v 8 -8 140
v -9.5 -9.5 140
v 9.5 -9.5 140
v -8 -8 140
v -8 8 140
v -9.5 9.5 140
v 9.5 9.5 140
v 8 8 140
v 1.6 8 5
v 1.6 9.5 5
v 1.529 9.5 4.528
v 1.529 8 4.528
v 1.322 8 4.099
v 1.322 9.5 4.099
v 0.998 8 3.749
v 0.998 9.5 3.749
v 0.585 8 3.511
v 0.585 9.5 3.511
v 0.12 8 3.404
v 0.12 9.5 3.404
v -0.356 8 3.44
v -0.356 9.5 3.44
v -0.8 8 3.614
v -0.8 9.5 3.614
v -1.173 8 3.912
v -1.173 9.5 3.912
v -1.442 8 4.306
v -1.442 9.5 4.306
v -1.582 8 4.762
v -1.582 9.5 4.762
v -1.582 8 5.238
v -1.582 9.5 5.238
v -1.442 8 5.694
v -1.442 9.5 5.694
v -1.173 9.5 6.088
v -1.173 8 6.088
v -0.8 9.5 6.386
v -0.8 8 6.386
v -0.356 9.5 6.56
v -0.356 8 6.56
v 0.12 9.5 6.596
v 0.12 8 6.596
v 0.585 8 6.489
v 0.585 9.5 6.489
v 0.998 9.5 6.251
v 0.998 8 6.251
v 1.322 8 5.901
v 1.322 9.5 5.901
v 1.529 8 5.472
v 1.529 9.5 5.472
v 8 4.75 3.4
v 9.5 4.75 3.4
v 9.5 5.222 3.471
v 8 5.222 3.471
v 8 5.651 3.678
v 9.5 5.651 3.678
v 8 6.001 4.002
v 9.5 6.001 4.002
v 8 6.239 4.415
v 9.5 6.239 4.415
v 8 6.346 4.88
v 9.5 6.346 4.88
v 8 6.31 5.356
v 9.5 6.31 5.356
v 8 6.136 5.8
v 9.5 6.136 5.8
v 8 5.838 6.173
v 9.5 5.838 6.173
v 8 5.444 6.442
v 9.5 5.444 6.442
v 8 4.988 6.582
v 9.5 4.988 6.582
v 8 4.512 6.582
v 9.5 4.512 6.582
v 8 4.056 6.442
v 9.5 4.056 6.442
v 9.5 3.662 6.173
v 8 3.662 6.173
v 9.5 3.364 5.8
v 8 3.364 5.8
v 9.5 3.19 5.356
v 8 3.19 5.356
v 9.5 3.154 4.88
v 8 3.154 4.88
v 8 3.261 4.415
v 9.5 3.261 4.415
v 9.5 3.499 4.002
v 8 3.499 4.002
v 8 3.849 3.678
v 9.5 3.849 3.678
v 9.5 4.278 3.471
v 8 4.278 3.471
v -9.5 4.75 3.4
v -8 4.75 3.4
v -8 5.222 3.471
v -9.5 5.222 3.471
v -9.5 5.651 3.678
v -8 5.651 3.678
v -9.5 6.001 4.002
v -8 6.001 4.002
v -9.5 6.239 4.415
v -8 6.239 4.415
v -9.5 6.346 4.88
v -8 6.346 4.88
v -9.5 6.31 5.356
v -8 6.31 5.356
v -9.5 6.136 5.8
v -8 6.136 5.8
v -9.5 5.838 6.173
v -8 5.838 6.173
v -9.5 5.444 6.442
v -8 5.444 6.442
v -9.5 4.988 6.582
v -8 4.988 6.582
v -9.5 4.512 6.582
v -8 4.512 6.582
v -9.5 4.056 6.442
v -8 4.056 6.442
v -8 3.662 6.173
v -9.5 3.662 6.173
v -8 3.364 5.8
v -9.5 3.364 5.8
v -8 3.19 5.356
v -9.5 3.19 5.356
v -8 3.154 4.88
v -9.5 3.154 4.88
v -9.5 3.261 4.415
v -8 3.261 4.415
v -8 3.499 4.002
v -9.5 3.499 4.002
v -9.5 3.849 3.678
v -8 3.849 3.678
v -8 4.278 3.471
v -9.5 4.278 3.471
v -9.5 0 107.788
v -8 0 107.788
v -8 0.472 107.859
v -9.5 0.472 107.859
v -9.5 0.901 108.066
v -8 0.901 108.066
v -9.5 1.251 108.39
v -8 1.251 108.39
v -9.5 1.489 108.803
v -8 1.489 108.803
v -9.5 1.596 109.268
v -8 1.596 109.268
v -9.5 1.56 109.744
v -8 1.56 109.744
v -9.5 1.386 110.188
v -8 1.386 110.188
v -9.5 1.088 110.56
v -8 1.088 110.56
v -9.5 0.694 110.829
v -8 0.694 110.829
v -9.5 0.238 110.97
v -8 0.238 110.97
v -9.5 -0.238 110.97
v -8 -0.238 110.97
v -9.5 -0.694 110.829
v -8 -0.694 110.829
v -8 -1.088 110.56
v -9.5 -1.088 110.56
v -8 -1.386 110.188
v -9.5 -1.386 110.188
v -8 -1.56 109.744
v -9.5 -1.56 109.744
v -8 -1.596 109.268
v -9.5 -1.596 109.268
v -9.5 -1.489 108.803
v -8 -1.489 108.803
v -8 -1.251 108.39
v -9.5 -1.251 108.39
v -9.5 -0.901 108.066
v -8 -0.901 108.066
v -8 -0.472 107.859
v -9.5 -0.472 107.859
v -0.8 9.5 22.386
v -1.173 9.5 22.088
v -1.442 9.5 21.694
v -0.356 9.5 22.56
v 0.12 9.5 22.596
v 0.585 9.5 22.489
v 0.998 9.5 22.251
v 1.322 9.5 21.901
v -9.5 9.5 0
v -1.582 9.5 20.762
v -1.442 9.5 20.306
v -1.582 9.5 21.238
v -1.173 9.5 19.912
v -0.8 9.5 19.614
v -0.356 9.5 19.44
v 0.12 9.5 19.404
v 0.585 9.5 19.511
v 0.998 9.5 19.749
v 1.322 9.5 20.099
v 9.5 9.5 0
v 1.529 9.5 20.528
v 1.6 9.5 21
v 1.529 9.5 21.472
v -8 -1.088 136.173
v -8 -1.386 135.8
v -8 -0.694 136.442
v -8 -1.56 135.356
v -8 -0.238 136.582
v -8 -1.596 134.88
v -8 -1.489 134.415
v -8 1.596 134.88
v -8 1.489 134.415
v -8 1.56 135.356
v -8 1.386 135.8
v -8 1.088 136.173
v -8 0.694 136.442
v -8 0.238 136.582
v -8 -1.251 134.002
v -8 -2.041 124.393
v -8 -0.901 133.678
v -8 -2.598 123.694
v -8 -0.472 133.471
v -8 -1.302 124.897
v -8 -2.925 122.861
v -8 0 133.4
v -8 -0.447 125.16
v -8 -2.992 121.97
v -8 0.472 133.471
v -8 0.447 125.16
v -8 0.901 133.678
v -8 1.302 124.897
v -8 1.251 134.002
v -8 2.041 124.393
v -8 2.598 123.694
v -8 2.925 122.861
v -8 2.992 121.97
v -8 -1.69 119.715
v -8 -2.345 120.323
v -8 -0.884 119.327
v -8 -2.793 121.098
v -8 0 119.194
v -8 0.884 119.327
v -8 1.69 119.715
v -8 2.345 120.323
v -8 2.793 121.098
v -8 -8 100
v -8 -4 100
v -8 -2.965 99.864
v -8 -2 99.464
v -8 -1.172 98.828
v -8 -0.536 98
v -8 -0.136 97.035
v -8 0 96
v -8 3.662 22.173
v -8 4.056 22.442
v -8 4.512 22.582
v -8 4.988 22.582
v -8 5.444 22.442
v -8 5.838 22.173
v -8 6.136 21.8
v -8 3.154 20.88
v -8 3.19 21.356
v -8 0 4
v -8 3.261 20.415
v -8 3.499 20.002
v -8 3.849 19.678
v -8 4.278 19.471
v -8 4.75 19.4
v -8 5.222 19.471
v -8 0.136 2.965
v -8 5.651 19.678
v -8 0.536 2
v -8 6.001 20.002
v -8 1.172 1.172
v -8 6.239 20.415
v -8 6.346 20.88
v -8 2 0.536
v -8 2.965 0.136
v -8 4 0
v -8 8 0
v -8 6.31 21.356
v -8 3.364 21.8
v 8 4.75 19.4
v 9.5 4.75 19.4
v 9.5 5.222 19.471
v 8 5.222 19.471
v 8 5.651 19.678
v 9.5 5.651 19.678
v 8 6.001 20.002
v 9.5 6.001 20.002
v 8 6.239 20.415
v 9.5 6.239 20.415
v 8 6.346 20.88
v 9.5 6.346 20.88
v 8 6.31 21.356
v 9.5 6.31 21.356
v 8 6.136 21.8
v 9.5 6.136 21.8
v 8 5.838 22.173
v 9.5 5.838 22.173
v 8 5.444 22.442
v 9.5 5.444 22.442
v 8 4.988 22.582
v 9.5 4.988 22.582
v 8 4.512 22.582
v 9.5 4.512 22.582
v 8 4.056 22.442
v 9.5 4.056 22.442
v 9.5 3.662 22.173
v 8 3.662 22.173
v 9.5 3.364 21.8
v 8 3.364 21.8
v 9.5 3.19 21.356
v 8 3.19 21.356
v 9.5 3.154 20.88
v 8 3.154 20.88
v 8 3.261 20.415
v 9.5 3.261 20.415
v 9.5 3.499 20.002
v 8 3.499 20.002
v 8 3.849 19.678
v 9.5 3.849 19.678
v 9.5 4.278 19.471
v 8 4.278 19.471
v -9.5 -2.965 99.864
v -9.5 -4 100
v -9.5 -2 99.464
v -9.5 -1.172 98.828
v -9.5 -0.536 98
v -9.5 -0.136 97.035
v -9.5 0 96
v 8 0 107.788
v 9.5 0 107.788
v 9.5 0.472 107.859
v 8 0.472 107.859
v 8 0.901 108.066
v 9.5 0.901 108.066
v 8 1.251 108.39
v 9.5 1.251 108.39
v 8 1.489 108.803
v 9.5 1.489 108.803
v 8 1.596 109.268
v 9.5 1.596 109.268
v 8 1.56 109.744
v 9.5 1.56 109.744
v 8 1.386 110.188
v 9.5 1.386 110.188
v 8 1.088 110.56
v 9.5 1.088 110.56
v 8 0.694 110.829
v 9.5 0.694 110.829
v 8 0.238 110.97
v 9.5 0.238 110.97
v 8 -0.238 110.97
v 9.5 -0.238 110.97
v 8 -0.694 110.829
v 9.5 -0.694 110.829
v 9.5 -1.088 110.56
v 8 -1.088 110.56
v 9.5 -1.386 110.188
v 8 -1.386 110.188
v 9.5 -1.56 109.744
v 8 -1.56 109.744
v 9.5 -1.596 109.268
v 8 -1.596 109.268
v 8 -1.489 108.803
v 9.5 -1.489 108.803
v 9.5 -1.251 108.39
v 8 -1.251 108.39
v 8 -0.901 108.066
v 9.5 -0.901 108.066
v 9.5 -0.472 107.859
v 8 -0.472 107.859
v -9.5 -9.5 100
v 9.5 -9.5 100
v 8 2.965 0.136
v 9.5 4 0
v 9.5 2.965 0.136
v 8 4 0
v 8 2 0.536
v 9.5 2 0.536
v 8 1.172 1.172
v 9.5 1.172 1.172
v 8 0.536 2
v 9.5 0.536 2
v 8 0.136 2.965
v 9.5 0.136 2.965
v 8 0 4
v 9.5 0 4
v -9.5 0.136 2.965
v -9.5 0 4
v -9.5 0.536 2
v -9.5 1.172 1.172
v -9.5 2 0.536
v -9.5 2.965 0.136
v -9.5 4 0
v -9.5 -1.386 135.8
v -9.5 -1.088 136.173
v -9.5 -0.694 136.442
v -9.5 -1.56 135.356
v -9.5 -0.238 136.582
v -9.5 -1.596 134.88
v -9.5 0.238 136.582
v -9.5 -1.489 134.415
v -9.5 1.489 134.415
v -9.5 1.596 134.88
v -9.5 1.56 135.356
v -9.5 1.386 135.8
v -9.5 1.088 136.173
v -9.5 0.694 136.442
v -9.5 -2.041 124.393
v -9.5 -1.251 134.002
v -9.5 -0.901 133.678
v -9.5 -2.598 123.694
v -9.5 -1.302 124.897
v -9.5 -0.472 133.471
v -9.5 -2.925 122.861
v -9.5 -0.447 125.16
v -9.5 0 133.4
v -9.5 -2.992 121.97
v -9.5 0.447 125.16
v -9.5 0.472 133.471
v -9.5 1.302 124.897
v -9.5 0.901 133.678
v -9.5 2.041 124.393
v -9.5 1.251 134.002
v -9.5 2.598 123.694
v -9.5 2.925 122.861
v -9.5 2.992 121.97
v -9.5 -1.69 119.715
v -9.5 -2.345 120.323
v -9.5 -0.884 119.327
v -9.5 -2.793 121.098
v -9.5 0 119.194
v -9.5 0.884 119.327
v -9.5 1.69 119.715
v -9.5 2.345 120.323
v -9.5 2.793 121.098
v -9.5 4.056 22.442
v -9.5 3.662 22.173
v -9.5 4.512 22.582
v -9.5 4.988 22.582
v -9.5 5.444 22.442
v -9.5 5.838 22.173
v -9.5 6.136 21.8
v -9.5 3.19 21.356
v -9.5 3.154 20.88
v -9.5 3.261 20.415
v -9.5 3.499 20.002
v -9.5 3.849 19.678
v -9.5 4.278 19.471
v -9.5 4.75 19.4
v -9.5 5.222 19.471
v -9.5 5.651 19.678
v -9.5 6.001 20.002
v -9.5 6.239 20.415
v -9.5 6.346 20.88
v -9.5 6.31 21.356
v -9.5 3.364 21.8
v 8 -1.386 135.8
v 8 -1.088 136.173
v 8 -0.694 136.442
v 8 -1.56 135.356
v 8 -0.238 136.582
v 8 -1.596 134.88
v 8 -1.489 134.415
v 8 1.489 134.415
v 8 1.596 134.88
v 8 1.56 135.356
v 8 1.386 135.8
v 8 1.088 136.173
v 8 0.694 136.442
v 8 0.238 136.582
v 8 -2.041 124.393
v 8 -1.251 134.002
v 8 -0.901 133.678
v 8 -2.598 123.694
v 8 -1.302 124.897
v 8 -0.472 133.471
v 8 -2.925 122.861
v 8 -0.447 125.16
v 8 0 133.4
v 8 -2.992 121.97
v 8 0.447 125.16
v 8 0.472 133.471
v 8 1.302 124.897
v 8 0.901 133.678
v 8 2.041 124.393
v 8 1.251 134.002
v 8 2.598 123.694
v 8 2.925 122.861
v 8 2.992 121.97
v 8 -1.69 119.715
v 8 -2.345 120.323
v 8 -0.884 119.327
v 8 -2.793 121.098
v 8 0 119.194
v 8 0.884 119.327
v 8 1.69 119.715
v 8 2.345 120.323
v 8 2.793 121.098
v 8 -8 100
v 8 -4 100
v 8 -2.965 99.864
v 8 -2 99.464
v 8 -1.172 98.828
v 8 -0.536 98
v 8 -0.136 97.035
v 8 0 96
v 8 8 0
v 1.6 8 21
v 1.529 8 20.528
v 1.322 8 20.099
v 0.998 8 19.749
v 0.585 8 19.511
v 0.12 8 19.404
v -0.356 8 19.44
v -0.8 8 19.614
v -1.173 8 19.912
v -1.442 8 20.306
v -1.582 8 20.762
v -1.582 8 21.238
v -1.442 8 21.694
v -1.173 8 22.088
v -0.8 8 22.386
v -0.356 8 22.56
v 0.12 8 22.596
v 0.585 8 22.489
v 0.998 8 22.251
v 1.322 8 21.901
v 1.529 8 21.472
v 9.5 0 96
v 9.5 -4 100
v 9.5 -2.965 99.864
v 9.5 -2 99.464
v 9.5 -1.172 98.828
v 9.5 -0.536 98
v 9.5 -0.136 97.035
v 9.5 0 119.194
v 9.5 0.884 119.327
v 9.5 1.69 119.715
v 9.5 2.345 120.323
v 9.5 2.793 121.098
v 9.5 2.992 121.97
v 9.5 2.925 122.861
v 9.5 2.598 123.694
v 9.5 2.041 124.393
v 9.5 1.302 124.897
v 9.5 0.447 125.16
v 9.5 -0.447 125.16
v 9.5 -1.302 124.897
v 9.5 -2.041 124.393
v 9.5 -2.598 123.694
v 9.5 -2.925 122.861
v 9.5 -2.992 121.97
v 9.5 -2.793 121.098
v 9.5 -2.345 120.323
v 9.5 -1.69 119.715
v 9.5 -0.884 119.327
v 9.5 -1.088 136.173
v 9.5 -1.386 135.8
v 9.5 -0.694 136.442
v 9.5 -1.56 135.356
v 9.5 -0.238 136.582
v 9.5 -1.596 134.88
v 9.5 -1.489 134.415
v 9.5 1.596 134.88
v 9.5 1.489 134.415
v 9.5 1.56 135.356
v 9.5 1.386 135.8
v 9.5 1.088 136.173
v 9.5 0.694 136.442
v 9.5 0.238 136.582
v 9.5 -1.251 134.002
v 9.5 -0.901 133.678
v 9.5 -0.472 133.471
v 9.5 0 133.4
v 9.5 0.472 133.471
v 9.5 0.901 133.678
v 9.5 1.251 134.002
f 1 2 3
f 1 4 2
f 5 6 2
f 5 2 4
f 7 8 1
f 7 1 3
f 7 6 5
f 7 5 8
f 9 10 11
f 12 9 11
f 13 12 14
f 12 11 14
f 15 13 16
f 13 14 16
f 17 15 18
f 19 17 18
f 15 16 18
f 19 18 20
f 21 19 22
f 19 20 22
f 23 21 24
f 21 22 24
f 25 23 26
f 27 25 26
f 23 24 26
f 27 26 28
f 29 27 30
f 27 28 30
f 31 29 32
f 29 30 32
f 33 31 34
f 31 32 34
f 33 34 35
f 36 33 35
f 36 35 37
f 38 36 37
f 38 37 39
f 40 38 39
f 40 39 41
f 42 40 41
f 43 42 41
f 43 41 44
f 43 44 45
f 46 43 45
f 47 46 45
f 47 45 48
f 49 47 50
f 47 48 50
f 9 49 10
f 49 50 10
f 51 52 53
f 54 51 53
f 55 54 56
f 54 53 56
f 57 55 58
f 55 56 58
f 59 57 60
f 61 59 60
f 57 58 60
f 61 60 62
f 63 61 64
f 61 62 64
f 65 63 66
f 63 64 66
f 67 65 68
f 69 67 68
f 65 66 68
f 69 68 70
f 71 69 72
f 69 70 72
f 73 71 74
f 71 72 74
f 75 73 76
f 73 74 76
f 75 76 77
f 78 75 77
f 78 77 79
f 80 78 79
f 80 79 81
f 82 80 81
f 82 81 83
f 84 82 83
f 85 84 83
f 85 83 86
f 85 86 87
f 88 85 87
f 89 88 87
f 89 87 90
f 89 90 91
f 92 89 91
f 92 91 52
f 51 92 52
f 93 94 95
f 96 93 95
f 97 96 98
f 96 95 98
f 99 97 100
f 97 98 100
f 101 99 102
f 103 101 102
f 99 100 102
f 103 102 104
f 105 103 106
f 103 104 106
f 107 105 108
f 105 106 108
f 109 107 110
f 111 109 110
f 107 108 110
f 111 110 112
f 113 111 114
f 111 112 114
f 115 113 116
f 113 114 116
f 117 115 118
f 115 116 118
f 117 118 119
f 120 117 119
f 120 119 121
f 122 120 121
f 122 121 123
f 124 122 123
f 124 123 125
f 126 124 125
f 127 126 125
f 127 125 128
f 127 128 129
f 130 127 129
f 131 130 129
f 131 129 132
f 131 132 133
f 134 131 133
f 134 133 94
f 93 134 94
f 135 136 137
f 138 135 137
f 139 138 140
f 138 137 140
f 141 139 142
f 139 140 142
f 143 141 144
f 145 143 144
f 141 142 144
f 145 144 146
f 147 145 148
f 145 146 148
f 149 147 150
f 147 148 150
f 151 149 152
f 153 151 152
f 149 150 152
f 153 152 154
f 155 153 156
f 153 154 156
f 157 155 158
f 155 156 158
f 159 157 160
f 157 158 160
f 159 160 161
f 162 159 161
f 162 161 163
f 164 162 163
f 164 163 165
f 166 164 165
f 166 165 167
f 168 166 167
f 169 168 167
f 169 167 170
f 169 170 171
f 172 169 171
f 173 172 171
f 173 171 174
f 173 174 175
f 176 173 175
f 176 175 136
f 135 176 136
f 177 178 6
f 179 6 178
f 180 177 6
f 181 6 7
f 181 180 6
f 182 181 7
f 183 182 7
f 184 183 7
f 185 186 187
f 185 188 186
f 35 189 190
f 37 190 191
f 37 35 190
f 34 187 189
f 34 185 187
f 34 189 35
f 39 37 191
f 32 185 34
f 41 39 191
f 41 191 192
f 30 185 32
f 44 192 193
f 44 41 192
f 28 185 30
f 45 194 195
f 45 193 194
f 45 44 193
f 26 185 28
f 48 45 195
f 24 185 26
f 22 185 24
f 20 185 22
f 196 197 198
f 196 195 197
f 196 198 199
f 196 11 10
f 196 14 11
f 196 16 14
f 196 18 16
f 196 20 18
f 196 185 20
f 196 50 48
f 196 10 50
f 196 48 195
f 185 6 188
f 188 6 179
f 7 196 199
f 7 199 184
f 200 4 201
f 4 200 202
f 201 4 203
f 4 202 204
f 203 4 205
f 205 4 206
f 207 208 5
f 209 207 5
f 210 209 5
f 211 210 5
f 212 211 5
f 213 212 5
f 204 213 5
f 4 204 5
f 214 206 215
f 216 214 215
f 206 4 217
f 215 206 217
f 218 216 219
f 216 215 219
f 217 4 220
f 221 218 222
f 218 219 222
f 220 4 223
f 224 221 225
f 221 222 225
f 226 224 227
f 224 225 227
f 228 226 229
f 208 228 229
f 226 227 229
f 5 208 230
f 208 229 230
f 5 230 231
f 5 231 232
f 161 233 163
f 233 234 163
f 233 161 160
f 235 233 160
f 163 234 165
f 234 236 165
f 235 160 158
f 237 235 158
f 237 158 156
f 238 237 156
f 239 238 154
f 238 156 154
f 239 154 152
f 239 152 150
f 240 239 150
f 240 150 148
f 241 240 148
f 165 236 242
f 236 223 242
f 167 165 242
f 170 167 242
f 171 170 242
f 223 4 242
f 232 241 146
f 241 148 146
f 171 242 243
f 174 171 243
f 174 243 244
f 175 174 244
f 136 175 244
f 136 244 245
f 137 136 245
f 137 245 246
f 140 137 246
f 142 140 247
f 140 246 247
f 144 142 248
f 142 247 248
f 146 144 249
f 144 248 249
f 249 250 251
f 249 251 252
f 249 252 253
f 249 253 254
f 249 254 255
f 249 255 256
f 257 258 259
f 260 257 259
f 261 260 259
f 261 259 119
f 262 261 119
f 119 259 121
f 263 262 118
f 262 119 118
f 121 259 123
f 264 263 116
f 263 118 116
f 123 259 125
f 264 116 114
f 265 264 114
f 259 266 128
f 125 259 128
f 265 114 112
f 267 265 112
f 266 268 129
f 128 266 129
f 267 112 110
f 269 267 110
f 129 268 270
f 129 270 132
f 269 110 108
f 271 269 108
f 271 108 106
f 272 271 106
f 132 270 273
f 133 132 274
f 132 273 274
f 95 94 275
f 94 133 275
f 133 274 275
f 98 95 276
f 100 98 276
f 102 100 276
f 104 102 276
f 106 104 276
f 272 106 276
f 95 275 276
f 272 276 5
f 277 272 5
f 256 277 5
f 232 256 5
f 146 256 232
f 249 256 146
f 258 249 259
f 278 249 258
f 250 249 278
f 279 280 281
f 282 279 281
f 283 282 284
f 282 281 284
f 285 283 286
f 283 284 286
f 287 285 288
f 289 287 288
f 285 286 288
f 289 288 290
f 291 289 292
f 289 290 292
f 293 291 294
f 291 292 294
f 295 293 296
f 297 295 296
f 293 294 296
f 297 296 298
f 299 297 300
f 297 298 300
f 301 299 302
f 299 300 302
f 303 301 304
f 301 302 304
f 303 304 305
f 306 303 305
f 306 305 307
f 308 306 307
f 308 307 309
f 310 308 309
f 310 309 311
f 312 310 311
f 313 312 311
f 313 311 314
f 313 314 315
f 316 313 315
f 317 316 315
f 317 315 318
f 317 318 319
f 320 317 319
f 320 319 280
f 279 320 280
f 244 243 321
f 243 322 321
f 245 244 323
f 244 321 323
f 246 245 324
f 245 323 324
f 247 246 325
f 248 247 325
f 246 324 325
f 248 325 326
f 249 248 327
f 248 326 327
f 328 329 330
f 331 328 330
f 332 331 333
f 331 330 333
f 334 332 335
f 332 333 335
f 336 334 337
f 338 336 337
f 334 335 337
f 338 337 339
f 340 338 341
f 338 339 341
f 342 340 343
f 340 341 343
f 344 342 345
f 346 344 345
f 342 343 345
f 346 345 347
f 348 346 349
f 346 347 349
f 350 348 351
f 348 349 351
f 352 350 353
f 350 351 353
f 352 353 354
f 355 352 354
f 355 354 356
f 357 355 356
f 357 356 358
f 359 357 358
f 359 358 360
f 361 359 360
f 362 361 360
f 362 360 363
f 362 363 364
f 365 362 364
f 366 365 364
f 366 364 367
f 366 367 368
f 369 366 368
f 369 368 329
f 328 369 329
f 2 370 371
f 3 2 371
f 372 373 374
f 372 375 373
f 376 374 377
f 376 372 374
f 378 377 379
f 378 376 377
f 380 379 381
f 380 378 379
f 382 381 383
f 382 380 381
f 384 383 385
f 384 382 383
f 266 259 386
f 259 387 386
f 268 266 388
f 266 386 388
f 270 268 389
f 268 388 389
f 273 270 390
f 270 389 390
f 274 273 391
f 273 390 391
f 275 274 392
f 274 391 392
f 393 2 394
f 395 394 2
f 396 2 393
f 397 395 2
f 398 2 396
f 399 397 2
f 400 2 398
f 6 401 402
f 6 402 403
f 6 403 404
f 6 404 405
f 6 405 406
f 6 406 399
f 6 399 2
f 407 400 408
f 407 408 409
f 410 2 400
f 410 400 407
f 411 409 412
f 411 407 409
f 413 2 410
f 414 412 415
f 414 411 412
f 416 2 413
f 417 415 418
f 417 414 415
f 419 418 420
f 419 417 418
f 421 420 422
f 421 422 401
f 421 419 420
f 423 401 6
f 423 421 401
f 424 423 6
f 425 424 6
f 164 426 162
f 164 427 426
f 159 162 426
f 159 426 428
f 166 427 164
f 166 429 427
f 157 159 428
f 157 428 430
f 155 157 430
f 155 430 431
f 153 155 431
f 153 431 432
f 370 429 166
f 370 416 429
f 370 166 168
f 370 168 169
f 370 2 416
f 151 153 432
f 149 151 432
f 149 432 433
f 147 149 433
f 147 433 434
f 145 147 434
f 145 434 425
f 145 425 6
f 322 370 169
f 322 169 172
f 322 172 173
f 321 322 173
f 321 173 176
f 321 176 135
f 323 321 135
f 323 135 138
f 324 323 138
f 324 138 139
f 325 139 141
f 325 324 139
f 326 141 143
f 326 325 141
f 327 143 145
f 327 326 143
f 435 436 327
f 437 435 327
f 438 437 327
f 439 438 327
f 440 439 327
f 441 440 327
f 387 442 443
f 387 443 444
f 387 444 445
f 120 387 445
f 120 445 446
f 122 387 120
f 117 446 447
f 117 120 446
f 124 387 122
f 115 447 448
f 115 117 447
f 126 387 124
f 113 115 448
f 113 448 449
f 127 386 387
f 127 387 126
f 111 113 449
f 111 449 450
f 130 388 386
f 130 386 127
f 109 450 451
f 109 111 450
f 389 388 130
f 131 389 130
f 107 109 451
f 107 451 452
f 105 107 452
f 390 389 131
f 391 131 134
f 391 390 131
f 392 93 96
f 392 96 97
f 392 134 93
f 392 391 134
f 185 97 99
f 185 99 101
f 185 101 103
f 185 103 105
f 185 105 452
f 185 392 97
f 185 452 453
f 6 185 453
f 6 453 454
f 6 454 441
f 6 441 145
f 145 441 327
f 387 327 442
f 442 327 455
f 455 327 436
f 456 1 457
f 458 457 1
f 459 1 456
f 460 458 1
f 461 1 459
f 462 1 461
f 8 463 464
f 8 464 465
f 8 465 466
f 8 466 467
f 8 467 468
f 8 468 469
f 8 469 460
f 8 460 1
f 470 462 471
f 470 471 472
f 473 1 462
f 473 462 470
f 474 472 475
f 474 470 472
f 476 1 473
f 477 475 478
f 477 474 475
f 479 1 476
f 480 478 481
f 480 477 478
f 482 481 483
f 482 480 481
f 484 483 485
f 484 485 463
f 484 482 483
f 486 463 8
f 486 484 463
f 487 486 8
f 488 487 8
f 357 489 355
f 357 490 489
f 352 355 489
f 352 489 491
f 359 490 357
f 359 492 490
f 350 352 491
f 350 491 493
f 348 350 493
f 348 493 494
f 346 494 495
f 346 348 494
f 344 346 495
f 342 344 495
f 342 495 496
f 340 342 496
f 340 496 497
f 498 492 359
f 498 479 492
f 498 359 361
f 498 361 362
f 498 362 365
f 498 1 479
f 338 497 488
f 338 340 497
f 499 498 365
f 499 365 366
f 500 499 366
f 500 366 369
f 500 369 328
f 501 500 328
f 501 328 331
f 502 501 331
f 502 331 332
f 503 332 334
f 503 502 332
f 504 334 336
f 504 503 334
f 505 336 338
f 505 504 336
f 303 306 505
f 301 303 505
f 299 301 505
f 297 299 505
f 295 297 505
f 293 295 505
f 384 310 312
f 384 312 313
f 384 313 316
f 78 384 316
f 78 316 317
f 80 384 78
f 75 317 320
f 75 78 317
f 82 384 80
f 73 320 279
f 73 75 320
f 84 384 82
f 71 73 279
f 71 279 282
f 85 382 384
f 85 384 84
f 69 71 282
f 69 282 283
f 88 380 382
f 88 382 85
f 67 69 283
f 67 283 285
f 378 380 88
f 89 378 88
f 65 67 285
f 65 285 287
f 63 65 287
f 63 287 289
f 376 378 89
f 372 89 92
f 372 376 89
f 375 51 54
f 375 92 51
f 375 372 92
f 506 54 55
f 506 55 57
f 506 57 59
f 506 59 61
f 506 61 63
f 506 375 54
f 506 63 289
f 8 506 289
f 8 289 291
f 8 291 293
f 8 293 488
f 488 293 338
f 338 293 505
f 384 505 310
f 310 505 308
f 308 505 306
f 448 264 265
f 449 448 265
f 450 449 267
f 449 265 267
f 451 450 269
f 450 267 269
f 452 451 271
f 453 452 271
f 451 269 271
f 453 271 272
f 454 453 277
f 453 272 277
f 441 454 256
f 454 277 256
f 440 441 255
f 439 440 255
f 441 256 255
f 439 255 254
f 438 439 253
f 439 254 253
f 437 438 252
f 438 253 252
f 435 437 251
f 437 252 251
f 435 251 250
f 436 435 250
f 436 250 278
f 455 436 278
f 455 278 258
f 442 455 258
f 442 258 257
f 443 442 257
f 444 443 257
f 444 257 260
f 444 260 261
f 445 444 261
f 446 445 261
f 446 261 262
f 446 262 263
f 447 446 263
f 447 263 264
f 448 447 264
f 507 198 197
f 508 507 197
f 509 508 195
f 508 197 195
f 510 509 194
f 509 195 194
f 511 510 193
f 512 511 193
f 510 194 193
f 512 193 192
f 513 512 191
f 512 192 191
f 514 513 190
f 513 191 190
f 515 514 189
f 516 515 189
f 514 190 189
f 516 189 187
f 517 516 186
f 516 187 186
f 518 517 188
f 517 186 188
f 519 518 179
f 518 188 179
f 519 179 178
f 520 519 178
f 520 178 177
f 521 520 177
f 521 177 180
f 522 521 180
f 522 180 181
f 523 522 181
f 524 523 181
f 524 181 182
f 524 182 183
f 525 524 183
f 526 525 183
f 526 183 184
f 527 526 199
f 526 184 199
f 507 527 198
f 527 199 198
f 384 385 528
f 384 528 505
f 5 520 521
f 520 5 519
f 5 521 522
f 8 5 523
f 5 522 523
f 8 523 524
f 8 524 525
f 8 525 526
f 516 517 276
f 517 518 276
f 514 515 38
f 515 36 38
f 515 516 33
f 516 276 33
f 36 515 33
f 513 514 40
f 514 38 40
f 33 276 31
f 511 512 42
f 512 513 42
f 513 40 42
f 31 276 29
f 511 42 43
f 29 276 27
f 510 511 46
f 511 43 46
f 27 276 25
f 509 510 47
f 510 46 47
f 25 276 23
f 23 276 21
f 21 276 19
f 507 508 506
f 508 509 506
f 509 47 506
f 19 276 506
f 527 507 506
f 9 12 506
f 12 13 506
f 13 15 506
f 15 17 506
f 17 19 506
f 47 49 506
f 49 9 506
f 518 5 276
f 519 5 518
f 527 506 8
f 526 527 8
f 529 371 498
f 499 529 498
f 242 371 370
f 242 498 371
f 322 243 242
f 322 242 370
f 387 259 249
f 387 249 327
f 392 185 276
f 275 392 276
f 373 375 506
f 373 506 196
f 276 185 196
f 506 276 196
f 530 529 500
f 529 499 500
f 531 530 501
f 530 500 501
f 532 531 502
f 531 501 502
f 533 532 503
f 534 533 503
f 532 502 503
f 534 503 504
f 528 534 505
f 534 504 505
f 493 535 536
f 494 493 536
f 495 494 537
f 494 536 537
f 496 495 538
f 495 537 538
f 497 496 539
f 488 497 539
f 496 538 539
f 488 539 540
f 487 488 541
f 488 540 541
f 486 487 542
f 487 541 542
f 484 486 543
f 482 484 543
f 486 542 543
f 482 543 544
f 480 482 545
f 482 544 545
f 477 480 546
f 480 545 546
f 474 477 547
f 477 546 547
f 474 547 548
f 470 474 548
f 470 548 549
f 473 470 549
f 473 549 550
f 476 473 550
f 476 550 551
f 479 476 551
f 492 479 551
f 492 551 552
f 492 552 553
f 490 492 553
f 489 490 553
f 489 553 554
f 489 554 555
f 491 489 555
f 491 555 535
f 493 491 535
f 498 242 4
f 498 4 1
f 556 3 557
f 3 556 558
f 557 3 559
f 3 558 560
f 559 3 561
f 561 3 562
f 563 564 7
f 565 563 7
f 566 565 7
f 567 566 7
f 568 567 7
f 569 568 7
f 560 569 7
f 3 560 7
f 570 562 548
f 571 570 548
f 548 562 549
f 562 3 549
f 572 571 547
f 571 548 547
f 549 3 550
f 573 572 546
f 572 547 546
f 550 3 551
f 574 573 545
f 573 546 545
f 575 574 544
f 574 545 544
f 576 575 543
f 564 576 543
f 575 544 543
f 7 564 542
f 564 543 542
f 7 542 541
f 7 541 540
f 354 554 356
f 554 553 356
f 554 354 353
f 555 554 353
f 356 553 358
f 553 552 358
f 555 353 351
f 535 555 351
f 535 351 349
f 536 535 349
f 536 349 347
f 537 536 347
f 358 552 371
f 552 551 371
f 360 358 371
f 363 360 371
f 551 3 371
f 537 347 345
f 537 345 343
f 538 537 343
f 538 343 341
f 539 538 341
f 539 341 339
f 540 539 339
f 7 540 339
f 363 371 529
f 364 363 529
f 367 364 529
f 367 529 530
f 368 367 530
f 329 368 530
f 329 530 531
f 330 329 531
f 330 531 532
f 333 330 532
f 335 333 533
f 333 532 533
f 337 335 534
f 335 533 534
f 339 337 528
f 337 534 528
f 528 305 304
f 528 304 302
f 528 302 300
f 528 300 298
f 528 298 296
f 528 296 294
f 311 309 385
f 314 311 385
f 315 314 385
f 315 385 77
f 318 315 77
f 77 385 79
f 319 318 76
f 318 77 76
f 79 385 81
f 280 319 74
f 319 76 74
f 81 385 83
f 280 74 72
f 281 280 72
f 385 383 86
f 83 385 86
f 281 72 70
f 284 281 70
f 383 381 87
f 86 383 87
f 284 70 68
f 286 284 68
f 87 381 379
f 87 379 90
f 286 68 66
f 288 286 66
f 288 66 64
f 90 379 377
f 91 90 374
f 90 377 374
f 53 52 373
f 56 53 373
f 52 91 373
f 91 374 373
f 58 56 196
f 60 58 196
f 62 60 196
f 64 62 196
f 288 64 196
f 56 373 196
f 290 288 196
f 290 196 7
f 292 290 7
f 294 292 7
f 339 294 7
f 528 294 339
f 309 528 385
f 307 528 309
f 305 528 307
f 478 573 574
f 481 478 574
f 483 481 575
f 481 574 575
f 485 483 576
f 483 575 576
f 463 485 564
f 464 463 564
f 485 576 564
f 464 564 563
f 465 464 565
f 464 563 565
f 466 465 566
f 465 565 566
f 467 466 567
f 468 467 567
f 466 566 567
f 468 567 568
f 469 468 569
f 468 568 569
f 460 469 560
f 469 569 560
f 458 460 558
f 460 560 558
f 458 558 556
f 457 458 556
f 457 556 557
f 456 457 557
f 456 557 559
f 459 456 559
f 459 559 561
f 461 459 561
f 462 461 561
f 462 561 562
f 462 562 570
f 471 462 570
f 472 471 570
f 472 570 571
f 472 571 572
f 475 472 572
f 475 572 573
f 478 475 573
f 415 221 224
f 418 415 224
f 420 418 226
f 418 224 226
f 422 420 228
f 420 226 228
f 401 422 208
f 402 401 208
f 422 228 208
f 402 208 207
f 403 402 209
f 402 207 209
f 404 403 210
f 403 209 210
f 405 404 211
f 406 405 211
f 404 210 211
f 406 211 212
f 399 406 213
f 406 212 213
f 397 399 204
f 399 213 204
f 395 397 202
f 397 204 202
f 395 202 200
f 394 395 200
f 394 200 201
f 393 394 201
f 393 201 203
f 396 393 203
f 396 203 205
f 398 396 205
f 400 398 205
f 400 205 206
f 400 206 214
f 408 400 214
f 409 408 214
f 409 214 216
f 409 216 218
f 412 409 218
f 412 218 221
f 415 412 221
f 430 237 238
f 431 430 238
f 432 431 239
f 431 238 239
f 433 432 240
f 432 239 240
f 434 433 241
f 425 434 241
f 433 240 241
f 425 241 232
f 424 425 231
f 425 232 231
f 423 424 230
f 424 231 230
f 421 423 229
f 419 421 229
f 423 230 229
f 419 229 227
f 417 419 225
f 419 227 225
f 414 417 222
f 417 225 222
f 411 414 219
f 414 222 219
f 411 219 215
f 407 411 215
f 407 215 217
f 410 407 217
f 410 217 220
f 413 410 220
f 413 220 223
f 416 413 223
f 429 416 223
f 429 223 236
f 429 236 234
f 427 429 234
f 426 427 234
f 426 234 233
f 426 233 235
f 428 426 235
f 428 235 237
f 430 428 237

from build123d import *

# Parameters (mm, degrees)
ESBO_O1_W                = 19
ESBO_O1_H                = 19
ESBO_O1_W_2              = 16
ESBO_O1_H_2              = 16
RESSALTO_EXTRUS_O1_DEPTH = 140
ESBO_O2_R                = 1.6
ESBO_O2_R_2              = 3
CORTE_EXTRUS_O1_DEPTH    = 20
ESBO_O3_R                = 1.6
CORTE_EXTRUS_O2_DEPTH    = 1.5
ESBO_O5_W                = 19
ESBO_O5_H                = 9.5
CORTE_EXTRUS_O4_DEPTH    = 100
FILETE1_R                = 4


with BuildPart() as part:
    # Esboço1 → Ressalto-extrusão1 (new body)
    with BuildSketch(Plane.XY):
        Rectangle(ESBO_O1_W, ESBO_O1_H)
        Rectangle(ESBO_O1_W_2, ESBO_O1_H_2, mode=Mode.SUBTRACT)
    extrude(amount=RESSALTO_EXTRUS_O1_DEPTH)

    # Esboço2 → Corte-extrusão1 (cut, through all)
    with BuildSketch(Plane(origin=(9.5, 0, 0), x_dir=(0, 0, -1), z_dir=(1, 0, 0))):
        with Locations((-109.38750305, 0)):
            Circle(ESBO_O2_R)
        with Locations((-135, 0)):
            Circle(ESBO_O2_R)
        with Locations((-122.193751525, 0)):
            Circle(ESBO_O2_R_2)
        with Locations((-5, 4.75)):
            Circle(ESBO_O2_R)
        with Locations((-21, 4.75)):
            Circle(ESBO_O2_R)
    extrude(amount=-CORTE_EXTRUS_O1_DEPTH, mode=Mode.SUBTRACT)

    # Esboço3 → Corte-extrusão2 (cut)
    with BuildSketch(Plane(origin=(0, 9.5, 0), x_dir=(1, 0, 0), z_dir=(0, 1, 0))):
        with Locations((0, -21)):
            Circle(ESBO_O3_R)
        with Locations((0, -5)):
            Circle(ESBO_O3_R)
    extrude(amount=-CORTE_EXTRUS_O2_DEPTH, mode=Mode.SUBTRACT)

    # Esboço5 → Corte-extrusão4 (cut)
    with BuildSketch(Plane(origin=(0, 0, 0), x_dir=(-1, 0, 0), z_dir=(0, 0, -1))):
        with Locations((0, -4.75)):
            Rectangle(ESBO_O5_W, ESBO_O5_H)
    extrude(amount=-CORTE_EXTRUS_O4_DEPTH, mode=Mode.SUBTRACT)

    # Filete1
    filete1_edges = [part.edges().sort_by_distance(p)[0] for p in [
        (-8.75, 0, 0),
        (8.75, 0, 0),
        (-8.75, 0, 100),
        (8.75, 0, 100),
    ]]
    fillet(filete1_edges, radius=FILETE1_R)


solid = part.part
